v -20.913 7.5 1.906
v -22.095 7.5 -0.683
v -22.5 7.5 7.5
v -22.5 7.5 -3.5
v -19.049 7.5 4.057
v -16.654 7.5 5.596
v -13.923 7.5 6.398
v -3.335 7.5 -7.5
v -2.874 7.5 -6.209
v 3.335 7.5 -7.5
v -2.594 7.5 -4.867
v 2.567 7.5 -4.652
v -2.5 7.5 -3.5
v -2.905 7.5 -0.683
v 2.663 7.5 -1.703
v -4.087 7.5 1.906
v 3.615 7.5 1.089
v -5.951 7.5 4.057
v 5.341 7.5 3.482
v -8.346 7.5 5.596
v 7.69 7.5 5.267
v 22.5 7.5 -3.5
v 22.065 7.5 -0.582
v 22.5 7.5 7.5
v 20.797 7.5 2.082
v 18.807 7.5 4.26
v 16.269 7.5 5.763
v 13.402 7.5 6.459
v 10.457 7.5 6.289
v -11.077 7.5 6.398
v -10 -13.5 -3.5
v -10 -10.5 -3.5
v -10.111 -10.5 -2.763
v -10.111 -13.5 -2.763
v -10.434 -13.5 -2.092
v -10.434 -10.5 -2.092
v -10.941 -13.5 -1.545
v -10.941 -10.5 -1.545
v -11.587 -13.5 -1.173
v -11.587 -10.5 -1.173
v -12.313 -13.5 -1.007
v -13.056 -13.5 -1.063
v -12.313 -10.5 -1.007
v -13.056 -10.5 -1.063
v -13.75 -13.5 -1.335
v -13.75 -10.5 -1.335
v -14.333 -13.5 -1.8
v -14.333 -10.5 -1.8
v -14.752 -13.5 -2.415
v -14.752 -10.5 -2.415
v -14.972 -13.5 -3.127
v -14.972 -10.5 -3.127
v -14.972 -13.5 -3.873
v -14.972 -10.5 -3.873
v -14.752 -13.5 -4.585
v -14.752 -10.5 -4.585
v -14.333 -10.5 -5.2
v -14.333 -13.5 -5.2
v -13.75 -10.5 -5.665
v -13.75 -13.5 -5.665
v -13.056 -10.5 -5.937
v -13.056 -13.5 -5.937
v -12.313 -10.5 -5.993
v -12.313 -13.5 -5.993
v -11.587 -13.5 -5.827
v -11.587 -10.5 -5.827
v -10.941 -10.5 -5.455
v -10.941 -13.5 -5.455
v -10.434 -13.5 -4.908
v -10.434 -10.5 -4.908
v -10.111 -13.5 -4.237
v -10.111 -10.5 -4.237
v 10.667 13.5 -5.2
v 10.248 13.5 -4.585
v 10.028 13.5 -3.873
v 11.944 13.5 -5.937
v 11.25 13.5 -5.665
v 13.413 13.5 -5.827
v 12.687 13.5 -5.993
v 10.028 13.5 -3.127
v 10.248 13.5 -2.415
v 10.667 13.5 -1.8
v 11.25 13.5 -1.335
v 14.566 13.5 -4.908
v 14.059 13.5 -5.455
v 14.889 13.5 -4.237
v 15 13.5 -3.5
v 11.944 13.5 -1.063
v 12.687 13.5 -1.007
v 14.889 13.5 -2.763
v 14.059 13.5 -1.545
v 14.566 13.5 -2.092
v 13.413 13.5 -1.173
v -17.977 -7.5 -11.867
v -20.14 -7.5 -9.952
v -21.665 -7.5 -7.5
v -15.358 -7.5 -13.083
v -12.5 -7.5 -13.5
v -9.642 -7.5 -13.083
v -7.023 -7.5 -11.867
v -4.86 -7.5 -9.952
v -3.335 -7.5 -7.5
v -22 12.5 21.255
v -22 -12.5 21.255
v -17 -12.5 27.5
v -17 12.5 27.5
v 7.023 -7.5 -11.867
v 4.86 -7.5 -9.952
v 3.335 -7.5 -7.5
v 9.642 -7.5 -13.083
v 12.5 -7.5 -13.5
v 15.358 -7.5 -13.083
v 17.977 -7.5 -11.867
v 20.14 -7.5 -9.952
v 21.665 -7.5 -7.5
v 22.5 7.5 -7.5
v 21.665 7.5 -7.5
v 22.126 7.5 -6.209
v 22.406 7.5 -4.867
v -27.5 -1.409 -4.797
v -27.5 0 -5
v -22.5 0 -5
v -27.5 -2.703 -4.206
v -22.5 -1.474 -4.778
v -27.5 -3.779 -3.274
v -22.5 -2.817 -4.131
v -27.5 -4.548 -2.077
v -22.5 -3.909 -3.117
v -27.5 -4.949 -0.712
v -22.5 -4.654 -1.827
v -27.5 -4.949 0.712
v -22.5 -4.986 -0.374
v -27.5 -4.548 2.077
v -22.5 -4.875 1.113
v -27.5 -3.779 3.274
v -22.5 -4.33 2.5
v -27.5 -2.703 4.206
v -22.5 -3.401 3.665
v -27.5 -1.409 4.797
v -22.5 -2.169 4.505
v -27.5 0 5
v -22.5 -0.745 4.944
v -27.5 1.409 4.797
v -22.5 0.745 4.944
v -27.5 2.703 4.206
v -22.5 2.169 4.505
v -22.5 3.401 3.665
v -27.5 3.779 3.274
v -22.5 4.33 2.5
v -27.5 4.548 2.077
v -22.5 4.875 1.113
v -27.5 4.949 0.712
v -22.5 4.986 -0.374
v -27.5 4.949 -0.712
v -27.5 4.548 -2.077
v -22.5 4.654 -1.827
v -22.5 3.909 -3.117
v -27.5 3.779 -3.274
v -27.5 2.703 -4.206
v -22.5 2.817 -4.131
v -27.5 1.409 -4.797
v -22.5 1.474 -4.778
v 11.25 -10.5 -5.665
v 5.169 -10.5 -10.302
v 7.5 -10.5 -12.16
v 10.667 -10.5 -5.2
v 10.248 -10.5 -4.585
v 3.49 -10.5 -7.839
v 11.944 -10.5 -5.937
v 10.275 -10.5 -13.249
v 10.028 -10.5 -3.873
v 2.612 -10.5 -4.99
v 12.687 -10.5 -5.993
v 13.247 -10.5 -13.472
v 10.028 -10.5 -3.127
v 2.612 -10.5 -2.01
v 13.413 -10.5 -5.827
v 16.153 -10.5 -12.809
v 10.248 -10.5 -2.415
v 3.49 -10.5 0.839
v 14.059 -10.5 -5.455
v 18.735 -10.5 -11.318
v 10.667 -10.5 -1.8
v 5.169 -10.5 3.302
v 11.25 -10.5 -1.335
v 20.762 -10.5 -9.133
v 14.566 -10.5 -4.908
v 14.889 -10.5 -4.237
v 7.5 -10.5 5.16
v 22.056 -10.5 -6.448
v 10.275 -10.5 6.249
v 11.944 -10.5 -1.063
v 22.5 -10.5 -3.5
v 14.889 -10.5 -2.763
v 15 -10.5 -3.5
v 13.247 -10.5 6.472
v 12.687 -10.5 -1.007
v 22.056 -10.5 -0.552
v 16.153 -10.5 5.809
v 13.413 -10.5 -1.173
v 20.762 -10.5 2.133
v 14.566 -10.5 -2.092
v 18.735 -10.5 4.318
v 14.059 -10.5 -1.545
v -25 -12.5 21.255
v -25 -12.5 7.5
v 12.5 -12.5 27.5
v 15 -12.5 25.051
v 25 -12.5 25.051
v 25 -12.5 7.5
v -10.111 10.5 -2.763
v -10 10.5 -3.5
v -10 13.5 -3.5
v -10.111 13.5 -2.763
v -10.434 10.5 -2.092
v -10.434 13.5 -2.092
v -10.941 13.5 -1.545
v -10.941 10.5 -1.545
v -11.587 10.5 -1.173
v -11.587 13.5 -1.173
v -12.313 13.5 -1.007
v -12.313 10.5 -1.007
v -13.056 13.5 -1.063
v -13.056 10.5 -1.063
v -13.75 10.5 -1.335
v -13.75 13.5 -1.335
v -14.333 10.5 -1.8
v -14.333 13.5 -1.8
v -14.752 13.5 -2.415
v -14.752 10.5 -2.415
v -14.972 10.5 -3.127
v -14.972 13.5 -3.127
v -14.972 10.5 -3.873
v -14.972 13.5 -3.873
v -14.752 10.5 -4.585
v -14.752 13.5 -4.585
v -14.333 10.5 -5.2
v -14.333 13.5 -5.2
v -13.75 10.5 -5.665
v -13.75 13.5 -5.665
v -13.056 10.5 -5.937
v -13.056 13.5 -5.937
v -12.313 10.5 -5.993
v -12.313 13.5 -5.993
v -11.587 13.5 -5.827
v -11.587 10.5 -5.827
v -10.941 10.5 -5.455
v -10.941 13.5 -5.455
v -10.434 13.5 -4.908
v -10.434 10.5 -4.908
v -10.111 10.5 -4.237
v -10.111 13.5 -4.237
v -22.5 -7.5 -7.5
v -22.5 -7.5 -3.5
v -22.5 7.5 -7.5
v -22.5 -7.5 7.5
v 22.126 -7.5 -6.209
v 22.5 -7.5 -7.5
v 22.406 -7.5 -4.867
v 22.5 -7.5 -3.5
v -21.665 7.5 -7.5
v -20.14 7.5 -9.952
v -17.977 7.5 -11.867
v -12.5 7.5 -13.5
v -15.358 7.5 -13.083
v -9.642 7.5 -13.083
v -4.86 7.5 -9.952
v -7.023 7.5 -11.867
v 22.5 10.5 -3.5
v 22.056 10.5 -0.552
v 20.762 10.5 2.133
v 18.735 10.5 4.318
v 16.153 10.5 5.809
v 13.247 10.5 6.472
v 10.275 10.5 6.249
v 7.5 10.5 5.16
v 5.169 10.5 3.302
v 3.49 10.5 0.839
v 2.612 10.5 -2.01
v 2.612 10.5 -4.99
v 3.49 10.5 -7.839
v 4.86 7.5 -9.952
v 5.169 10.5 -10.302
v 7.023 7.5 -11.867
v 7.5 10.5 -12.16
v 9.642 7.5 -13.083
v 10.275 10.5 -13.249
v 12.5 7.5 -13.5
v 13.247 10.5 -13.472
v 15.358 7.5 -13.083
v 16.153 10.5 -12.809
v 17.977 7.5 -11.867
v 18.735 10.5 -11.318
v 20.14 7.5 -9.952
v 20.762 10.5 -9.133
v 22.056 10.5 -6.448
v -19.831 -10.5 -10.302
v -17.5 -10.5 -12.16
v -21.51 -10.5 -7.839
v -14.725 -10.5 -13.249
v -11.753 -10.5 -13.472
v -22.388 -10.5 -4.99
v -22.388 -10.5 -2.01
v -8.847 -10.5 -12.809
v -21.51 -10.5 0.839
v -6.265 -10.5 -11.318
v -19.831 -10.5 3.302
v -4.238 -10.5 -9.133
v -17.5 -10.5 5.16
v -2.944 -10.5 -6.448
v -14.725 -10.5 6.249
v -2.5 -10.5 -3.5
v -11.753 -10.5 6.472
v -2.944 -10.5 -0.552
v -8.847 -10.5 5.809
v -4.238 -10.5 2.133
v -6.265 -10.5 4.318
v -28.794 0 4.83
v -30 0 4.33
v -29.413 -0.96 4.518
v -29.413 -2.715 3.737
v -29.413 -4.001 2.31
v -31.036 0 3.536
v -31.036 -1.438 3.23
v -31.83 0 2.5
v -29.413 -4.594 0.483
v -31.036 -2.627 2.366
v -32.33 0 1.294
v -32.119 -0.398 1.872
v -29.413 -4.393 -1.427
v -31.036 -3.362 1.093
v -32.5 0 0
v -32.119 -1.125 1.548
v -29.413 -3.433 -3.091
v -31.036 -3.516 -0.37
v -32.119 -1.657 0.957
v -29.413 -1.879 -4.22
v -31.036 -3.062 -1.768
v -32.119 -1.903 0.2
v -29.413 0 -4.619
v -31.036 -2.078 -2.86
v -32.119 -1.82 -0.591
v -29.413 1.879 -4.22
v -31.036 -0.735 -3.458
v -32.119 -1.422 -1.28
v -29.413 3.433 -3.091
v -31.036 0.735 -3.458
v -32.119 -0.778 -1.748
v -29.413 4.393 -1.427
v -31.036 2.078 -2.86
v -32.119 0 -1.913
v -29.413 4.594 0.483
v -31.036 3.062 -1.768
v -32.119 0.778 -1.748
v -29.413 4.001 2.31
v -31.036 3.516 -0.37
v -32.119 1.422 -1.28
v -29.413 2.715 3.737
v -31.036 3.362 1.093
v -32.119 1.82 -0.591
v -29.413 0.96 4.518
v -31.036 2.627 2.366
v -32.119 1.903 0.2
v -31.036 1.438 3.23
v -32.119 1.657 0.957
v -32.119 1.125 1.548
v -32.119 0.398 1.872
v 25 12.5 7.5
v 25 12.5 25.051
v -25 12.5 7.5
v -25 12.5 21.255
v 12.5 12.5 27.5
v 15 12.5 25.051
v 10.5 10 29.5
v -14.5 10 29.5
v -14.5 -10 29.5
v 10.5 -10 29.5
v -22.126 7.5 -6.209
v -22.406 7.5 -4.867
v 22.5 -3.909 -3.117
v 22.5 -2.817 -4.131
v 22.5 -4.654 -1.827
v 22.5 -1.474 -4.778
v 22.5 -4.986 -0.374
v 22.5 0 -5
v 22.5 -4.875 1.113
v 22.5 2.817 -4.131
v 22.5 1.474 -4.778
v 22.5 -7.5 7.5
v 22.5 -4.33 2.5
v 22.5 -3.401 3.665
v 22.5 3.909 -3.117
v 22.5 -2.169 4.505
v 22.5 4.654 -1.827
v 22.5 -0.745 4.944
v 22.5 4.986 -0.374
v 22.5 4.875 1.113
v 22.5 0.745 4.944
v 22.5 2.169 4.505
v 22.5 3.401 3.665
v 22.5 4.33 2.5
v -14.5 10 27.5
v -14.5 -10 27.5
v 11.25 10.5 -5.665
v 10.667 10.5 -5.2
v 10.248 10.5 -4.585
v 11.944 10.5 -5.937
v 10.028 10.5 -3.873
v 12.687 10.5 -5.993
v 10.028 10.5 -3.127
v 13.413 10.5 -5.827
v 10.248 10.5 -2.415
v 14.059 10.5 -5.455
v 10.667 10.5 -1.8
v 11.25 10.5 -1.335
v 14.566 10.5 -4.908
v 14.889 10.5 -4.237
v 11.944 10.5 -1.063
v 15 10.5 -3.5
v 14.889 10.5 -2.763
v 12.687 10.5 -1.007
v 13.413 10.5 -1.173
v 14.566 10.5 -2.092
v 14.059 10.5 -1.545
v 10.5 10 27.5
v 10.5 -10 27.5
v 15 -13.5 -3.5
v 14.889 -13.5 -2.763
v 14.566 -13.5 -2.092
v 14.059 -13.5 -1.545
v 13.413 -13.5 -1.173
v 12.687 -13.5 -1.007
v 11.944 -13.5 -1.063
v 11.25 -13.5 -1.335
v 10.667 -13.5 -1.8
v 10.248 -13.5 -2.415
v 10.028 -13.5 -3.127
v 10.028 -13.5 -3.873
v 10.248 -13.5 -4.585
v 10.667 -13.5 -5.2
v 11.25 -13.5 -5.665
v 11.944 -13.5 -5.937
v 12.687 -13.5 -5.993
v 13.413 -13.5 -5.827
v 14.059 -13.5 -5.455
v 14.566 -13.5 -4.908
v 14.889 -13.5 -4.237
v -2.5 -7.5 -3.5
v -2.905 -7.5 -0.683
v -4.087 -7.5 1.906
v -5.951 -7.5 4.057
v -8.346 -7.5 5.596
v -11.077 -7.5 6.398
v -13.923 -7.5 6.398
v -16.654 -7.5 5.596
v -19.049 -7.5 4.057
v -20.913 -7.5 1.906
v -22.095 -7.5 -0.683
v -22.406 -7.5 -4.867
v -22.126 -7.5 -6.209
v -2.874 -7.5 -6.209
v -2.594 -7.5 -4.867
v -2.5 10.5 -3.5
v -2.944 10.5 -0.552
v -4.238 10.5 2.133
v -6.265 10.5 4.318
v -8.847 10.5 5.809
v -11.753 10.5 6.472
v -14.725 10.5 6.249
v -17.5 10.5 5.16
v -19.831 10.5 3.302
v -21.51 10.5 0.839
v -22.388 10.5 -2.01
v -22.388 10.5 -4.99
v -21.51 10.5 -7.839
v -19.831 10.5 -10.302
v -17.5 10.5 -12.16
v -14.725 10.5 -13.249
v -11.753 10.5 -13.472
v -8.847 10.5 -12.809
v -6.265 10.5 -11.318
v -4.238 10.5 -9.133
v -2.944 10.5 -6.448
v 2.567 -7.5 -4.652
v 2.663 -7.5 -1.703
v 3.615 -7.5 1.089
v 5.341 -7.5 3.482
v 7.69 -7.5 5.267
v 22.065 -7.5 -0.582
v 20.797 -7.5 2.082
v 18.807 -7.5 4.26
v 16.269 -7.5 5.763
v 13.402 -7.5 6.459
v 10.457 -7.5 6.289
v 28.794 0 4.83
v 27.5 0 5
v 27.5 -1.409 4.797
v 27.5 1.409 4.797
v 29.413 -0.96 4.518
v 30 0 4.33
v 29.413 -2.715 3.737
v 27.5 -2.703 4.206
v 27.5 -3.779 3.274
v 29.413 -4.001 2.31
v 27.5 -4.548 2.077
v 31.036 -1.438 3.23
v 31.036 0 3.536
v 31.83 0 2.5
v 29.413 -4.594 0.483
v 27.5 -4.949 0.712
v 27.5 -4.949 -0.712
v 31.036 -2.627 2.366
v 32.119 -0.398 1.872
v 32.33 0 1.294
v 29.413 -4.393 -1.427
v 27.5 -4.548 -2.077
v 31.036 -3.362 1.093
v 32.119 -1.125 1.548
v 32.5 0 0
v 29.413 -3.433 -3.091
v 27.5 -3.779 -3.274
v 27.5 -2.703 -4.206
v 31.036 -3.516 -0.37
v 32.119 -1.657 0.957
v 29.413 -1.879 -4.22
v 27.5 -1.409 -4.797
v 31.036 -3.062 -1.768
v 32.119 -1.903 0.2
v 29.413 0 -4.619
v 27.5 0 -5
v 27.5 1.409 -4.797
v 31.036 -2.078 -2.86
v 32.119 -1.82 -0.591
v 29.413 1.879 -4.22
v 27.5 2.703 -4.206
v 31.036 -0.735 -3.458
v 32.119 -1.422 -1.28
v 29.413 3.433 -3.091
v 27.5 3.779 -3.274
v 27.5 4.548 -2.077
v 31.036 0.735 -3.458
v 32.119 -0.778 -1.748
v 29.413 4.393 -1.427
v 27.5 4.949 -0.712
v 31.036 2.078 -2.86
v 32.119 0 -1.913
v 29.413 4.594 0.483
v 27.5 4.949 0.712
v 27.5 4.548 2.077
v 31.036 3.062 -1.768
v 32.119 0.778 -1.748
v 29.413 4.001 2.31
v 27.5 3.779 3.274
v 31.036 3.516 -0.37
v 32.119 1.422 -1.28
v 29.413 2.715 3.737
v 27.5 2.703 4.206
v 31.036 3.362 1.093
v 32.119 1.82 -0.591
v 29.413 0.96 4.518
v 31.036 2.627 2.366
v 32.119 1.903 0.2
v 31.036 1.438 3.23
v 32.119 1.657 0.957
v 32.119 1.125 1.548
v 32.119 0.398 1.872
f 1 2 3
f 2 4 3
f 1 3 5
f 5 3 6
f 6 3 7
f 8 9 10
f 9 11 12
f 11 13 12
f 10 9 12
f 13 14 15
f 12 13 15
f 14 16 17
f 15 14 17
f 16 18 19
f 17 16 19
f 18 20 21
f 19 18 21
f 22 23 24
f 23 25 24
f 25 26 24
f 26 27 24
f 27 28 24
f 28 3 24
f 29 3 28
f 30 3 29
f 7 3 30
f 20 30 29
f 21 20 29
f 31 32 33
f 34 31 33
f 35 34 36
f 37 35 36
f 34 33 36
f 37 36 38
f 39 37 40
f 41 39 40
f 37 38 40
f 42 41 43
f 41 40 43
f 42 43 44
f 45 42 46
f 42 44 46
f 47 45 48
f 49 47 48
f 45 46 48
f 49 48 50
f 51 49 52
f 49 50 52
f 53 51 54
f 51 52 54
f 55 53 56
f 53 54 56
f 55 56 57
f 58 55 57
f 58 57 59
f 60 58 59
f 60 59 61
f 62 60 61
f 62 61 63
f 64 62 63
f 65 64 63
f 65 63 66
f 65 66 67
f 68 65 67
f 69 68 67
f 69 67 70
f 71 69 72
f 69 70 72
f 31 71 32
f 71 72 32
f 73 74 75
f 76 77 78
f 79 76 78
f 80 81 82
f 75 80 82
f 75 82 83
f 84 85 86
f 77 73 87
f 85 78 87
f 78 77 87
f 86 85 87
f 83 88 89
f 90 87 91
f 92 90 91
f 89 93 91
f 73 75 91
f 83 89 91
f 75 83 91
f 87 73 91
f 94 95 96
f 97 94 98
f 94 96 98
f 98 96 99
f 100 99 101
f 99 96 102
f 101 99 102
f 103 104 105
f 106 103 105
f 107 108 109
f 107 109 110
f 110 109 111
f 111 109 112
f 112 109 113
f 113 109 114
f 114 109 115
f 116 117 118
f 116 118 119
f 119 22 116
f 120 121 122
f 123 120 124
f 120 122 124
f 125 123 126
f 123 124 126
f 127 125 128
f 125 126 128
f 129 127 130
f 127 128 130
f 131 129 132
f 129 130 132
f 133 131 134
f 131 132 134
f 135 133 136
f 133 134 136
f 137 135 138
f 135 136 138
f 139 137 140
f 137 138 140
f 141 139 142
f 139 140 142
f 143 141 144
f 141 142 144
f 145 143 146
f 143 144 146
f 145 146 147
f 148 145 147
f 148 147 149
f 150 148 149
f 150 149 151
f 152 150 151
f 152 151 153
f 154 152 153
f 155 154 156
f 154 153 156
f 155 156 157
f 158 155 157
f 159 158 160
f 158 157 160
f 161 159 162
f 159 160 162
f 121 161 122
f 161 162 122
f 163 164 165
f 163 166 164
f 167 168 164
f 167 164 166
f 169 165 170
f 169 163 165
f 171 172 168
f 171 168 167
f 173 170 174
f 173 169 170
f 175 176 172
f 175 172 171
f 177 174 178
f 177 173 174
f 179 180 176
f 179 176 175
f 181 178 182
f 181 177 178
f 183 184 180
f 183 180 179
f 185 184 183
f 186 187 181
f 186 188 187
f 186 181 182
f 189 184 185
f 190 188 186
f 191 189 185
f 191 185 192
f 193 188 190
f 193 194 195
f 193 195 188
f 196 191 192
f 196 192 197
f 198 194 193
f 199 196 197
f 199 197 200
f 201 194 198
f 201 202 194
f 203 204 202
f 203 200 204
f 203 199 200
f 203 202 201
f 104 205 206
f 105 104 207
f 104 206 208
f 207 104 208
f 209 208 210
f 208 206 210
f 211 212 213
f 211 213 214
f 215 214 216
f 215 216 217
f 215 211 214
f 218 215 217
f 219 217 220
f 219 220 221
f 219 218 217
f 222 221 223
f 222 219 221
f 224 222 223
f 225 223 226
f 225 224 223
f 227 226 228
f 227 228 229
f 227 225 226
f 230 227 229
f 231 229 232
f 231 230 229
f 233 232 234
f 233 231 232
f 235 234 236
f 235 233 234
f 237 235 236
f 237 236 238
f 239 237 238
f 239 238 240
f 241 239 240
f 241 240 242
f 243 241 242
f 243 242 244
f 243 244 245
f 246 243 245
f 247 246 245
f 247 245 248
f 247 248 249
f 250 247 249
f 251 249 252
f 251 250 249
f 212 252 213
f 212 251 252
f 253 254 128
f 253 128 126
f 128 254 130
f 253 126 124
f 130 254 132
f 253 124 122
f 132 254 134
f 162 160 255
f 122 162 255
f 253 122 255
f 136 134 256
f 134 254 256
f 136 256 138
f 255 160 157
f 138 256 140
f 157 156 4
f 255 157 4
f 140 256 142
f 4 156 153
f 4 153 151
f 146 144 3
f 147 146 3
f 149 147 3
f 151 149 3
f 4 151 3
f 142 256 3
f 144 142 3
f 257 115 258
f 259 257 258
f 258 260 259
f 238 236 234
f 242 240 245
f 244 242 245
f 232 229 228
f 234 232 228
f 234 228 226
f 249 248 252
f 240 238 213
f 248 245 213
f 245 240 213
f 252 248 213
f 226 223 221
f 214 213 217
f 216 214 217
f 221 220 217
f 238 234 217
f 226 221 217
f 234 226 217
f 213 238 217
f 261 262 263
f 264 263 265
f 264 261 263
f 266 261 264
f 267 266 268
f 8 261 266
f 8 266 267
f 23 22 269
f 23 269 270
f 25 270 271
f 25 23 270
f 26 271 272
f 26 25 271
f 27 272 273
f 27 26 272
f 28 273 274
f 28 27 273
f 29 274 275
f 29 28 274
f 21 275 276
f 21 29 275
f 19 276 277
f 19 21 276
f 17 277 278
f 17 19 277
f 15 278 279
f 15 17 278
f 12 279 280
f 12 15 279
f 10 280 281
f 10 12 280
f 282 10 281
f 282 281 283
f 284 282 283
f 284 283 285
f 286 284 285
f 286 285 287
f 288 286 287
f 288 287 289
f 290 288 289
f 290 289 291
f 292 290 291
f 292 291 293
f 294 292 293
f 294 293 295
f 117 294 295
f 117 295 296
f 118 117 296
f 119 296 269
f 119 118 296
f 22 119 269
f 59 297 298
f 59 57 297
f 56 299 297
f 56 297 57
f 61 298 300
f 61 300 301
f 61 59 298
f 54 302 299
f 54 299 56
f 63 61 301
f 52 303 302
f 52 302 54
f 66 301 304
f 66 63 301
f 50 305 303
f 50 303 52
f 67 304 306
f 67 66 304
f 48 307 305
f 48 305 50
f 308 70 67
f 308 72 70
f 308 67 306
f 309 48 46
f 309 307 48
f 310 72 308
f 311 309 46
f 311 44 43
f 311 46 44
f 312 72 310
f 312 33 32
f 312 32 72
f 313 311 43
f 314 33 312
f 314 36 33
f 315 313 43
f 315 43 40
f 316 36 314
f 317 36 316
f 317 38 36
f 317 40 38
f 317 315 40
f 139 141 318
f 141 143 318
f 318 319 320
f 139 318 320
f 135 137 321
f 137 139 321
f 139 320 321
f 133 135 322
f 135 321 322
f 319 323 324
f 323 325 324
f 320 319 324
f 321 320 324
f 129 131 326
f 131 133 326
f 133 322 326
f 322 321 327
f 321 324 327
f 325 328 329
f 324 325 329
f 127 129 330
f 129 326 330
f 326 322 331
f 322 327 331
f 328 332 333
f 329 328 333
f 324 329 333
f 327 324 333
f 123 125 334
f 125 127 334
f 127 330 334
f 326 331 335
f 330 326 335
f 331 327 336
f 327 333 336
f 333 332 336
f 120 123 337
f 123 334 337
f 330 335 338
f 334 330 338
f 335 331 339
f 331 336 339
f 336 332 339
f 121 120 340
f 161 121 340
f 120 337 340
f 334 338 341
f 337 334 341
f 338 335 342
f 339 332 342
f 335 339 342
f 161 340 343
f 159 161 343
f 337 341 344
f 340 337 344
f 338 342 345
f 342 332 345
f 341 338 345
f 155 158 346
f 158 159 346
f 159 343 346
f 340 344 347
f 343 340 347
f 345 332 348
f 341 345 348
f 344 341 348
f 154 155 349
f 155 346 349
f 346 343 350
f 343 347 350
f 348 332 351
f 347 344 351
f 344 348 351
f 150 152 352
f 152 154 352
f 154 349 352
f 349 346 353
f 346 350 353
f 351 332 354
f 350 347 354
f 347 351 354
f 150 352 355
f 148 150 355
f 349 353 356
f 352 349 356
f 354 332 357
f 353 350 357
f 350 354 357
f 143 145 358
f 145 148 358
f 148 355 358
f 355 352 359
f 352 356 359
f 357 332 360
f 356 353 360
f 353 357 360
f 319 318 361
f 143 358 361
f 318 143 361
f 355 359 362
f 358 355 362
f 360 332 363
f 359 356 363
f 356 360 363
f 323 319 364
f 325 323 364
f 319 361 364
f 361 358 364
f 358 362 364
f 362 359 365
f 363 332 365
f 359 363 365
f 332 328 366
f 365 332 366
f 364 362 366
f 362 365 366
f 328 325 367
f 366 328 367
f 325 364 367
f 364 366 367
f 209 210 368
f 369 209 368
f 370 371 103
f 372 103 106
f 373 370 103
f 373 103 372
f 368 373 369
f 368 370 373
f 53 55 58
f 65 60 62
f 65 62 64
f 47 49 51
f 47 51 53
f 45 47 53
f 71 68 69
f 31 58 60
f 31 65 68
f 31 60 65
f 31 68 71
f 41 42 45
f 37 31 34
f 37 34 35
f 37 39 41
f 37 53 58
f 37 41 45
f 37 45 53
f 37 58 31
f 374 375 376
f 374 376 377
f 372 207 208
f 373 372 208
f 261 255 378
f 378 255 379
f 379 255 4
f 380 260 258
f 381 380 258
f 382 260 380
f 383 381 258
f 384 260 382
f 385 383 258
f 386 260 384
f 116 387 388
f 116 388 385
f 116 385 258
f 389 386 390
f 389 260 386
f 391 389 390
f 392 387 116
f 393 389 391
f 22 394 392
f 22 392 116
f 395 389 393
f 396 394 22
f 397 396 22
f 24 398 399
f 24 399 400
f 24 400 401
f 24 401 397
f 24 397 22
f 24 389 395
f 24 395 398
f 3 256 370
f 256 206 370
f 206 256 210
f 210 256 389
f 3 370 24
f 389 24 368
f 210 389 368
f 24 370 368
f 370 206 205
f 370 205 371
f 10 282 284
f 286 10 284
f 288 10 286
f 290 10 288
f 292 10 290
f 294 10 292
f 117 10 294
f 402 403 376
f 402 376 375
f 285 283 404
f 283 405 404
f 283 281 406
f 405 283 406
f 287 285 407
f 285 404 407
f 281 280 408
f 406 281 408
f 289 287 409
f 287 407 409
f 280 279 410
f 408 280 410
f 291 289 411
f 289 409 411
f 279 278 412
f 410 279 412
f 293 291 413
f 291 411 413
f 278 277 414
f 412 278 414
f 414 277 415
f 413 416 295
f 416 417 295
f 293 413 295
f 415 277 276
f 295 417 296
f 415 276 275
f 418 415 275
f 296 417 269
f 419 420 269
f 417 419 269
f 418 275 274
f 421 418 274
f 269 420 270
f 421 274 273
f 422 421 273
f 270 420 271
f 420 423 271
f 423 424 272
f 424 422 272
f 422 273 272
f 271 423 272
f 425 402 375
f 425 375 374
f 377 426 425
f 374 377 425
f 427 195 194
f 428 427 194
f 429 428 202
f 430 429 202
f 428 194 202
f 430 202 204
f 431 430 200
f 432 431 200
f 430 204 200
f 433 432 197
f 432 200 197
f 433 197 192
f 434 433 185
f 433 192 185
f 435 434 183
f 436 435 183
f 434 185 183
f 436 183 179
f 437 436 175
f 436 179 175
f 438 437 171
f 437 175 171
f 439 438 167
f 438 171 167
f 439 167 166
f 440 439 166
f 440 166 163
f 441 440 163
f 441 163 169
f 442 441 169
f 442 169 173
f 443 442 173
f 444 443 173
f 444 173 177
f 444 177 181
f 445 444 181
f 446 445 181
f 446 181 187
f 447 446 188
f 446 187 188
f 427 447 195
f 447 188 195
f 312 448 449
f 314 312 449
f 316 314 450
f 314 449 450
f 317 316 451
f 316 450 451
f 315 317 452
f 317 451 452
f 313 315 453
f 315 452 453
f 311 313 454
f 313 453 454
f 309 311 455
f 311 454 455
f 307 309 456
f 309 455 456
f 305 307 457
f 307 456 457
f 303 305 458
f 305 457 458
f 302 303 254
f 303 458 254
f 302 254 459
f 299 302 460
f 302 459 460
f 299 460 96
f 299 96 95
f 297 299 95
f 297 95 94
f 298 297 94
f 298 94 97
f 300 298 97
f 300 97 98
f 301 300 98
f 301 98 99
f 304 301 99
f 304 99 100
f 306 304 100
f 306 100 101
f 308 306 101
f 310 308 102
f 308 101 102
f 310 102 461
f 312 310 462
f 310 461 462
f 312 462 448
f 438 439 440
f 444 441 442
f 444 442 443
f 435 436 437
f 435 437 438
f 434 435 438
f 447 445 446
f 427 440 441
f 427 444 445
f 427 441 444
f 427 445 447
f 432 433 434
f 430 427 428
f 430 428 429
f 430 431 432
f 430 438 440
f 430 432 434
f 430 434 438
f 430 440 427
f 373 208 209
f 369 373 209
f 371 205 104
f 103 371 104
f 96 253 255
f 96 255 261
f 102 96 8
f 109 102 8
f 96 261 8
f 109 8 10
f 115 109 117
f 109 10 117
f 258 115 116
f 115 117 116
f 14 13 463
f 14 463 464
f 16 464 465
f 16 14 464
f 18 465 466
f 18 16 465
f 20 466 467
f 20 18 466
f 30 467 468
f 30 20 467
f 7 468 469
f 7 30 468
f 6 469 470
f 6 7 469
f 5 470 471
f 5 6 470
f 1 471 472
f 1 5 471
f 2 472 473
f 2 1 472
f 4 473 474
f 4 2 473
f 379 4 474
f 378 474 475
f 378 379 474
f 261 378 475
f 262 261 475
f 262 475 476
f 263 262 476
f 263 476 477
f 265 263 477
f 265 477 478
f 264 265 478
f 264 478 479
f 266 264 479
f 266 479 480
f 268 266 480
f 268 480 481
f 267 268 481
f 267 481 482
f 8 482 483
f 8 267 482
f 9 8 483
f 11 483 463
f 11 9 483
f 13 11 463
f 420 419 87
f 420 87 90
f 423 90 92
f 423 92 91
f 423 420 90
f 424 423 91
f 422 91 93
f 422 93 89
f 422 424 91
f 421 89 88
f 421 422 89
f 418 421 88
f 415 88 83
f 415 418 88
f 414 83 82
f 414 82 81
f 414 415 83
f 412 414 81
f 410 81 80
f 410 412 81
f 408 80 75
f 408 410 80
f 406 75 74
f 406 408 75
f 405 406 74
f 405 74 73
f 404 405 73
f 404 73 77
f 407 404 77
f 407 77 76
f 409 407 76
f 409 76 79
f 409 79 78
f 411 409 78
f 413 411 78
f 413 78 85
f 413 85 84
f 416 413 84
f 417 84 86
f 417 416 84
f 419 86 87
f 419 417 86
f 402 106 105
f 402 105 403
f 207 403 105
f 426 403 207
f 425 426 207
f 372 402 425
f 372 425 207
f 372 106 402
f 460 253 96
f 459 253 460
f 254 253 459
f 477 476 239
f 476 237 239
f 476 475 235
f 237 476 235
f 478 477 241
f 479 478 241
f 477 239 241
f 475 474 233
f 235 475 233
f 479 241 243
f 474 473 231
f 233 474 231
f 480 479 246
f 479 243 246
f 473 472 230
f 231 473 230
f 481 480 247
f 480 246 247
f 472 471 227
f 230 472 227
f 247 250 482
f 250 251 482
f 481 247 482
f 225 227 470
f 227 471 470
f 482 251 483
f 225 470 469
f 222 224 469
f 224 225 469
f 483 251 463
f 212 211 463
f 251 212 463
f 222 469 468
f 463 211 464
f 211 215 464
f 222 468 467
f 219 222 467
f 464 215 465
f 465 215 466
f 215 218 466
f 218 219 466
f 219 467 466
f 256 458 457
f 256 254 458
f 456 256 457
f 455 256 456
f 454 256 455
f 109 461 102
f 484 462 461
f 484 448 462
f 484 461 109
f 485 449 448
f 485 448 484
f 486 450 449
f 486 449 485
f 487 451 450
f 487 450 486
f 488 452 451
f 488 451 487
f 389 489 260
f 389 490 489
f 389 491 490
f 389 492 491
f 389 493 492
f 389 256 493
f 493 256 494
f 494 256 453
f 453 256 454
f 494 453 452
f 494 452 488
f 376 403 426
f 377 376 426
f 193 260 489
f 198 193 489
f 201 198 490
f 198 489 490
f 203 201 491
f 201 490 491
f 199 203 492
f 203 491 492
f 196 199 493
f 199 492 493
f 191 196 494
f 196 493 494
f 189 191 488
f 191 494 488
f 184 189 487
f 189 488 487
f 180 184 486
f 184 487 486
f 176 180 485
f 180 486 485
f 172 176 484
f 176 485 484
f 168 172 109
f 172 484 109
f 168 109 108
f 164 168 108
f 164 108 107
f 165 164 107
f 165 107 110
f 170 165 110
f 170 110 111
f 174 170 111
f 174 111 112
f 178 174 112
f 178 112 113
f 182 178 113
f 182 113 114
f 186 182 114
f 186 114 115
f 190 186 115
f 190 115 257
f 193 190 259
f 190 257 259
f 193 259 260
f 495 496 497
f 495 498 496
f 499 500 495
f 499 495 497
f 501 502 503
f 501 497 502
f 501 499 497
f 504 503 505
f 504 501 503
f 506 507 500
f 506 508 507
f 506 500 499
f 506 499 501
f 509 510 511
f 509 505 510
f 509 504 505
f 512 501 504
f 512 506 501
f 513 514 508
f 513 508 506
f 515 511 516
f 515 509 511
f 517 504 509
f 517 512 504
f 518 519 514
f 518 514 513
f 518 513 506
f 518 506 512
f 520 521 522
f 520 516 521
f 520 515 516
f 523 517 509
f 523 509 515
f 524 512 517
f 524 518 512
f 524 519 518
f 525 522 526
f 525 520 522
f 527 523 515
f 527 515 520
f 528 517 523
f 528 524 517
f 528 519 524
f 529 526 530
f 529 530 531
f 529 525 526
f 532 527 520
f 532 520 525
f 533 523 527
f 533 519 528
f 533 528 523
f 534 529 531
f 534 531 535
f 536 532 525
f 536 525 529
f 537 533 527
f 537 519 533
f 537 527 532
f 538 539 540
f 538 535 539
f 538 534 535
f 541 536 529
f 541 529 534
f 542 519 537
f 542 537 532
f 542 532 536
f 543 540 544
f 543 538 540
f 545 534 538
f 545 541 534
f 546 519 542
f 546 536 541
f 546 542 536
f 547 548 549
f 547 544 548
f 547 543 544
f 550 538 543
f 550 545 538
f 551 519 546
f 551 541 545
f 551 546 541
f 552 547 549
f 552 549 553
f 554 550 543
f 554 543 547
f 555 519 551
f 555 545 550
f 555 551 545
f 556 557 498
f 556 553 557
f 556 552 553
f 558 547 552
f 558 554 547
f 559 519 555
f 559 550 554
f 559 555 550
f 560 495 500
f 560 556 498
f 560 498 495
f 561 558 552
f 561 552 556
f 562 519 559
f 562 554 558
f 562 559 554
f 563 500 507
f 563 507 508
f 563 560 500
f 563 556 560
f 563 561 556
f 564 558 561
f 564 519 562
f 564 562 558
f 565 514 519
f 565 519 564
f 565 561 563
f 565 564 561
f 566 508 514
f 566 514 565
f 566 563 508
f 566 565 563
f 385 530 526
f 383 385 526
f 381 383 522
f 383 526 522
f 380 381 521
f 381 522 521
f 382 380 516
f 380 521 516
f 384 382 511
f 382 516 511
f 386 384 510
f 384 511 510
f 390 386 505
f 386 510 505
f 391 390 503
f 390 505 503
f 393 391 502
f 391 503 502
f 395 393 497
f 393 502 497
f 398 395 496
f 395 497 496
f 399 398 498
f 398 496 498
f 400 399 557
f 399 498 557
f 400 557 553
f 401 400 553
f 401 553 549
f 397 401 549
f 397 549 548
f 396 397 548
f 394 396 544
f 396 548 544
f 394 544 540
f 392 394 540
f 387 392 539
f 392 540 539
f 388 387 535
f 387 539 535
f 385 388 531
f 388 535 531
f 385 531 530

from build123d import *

# Parameters (mm, degrees)
F0_W      = 45
F0_H      = 15
F1_DEPTH  = 7.5
F2_W      = 50
F2_H      = 25
F3_DEPTH  = 20
F5_DEPTH  = 25
F7_DEPTH  = 25
F8_W      = 25
F8_H      = 20
F9_DEPTH  = 2
F11_W     = 5
F11_H     = 5
F13_W     = 5
F13_H     = 5
F15_R     = 10
F16_DEPTH = 3
F17_R     = 10
F18_DEPTH = 3
F19_R     = 2.5
F20_DEPTH = 3
F21_R     = 2.5
F22_DEPTH = 3


# Not quite as in the source:
# - a pattern or mirror of a feature is missing from the dataset's text; its kind, count and spacing are read off the source's solid


with BuildPart() as f1:
    # F0 (on Top) → F1 (new body, symmetric)
    with BuildSketch(Plane.XY):
        Rectangle(F0_W, F0_H)
    extrude(amount=F1_DEPTH, both=True)

    # F2 (on face) → F3 (join)
    with BuildSketch(Plane.XY.offset(7.5)):
        Rectangle(F2_W, F2_H)
    extrude(amount=F3_DEPTH)

    # F4 (on face) → F5 (cut, through all)
    with BuildSketch(Plane.XZ.offset(12.5)):
        Polygon((25, 27.5), (12.5, 27.5), (15, 25.0505102572), (25, 25.0505102572), align=None)
    extrude(amount=-F5_DEPTH, mode=Mode.SUBTRACT)

    # F6 (on face) → F7 (cut, through all)
    with BuildSketch(Plane.XZ.offset(12.5)):
        Polygon((-25, 27.5), (-25, 21.2550020016), (-22, 21.2550020016), (-17, 27.5), align=None)
    extrude(amount=-F7_DEPTH, mode=Mode.SUBTRACT)

    # F8 (on face) → F9 (join)
    with BuildSketch(Plane.XY.offset(27.5)):
        with Locations((-2, 0)):
            Rectangle(F8_W, F8_H)
    extrude(amount=F9_DEPTH)

    # F11 (on Front) → F12 (revolve)
    with BuildSketch(Plane.XZ):
        with Locations((25, -2.5)):
            Rectangle(F11_W, F11_H)
    revolve(axis=Axis((-8.4795374423, 0, 0), (-1, 0, 0)))

    # F13 (on Front) → F14 (revolve)
    with BuildSketch(Plane.XZ):
        with Locations((-25, -2.5)):
            Rectangle(F13_W, F13_H)
    revolve(axis=Axis((-8.4795374423, 0, 0), (-1, 0, 0)))

    # F15 (on face) → F16 (join)
    with BuildSketch(Plane.XZ.offset(7.5)):
        with Locations((-12.5, -3.5)):
            Circle(F15_R)
    f16 = extrude(amount=F16_DEPTH)

    # F16_copies: F16 across plane
    add(f16.mirror(Plane.ZX))

    # F17 (on face) → F18 (join)
    with BuildSketch(Plane.XZ.offset(7.5)):
        with Locations((12.5, -3.5)):
            Circle(F17_R)
    f18 = extrude(amount=F18_DEPTH)

    # F18_copies: F18 across plane
    add(f18.mirror(Plane.ZX))

    # F19 (on face) → F20 (join)
    with BuildSketch(Plane.XZ.offset(10.5)):
        with Locations((-12.5, -3.5)):
            Circle(F19_R)
    f20 = extrude(amount=F20_DEPTH)

    # F20_copies: F20 across plane
    add(f20.mirror(Plane.ZX))

    # F21 (on face) → F22 (join)
    with BuildSketch(Plane.XZ.offset(10.5)):
        with Locations((12.5, -3.5)):
            Circle(F21_R)
    f22 = extrude(amount=F22_DEPTH)

    # F22_copies: F22 across plane
    add(f22.mirror(Plane.ZX))

    # F23 (on Front) → F24 (revolve)
    with BuildSketch(Plane.XZ):
        with BuildLine():
            Line((-27.5, 0), (-27.5, 5))
            ThreePointArc((-27.5, 5), (-31.0355339059, 3.5355339059), (-32.5, 0))
            Line((-32.5, 0), (-27.5, 0))
        make_face()
    f24 = revolve(axis=Axis((-30, 0, 0), (1, 0, 0)))

    # F24_copies: F24 across plane
    add(f24.mirror(Plane(origin=(0, 0, 0), x_dir=(0, 0, 1), z_dir=(1, 0, 0))))


solid = f1.part
